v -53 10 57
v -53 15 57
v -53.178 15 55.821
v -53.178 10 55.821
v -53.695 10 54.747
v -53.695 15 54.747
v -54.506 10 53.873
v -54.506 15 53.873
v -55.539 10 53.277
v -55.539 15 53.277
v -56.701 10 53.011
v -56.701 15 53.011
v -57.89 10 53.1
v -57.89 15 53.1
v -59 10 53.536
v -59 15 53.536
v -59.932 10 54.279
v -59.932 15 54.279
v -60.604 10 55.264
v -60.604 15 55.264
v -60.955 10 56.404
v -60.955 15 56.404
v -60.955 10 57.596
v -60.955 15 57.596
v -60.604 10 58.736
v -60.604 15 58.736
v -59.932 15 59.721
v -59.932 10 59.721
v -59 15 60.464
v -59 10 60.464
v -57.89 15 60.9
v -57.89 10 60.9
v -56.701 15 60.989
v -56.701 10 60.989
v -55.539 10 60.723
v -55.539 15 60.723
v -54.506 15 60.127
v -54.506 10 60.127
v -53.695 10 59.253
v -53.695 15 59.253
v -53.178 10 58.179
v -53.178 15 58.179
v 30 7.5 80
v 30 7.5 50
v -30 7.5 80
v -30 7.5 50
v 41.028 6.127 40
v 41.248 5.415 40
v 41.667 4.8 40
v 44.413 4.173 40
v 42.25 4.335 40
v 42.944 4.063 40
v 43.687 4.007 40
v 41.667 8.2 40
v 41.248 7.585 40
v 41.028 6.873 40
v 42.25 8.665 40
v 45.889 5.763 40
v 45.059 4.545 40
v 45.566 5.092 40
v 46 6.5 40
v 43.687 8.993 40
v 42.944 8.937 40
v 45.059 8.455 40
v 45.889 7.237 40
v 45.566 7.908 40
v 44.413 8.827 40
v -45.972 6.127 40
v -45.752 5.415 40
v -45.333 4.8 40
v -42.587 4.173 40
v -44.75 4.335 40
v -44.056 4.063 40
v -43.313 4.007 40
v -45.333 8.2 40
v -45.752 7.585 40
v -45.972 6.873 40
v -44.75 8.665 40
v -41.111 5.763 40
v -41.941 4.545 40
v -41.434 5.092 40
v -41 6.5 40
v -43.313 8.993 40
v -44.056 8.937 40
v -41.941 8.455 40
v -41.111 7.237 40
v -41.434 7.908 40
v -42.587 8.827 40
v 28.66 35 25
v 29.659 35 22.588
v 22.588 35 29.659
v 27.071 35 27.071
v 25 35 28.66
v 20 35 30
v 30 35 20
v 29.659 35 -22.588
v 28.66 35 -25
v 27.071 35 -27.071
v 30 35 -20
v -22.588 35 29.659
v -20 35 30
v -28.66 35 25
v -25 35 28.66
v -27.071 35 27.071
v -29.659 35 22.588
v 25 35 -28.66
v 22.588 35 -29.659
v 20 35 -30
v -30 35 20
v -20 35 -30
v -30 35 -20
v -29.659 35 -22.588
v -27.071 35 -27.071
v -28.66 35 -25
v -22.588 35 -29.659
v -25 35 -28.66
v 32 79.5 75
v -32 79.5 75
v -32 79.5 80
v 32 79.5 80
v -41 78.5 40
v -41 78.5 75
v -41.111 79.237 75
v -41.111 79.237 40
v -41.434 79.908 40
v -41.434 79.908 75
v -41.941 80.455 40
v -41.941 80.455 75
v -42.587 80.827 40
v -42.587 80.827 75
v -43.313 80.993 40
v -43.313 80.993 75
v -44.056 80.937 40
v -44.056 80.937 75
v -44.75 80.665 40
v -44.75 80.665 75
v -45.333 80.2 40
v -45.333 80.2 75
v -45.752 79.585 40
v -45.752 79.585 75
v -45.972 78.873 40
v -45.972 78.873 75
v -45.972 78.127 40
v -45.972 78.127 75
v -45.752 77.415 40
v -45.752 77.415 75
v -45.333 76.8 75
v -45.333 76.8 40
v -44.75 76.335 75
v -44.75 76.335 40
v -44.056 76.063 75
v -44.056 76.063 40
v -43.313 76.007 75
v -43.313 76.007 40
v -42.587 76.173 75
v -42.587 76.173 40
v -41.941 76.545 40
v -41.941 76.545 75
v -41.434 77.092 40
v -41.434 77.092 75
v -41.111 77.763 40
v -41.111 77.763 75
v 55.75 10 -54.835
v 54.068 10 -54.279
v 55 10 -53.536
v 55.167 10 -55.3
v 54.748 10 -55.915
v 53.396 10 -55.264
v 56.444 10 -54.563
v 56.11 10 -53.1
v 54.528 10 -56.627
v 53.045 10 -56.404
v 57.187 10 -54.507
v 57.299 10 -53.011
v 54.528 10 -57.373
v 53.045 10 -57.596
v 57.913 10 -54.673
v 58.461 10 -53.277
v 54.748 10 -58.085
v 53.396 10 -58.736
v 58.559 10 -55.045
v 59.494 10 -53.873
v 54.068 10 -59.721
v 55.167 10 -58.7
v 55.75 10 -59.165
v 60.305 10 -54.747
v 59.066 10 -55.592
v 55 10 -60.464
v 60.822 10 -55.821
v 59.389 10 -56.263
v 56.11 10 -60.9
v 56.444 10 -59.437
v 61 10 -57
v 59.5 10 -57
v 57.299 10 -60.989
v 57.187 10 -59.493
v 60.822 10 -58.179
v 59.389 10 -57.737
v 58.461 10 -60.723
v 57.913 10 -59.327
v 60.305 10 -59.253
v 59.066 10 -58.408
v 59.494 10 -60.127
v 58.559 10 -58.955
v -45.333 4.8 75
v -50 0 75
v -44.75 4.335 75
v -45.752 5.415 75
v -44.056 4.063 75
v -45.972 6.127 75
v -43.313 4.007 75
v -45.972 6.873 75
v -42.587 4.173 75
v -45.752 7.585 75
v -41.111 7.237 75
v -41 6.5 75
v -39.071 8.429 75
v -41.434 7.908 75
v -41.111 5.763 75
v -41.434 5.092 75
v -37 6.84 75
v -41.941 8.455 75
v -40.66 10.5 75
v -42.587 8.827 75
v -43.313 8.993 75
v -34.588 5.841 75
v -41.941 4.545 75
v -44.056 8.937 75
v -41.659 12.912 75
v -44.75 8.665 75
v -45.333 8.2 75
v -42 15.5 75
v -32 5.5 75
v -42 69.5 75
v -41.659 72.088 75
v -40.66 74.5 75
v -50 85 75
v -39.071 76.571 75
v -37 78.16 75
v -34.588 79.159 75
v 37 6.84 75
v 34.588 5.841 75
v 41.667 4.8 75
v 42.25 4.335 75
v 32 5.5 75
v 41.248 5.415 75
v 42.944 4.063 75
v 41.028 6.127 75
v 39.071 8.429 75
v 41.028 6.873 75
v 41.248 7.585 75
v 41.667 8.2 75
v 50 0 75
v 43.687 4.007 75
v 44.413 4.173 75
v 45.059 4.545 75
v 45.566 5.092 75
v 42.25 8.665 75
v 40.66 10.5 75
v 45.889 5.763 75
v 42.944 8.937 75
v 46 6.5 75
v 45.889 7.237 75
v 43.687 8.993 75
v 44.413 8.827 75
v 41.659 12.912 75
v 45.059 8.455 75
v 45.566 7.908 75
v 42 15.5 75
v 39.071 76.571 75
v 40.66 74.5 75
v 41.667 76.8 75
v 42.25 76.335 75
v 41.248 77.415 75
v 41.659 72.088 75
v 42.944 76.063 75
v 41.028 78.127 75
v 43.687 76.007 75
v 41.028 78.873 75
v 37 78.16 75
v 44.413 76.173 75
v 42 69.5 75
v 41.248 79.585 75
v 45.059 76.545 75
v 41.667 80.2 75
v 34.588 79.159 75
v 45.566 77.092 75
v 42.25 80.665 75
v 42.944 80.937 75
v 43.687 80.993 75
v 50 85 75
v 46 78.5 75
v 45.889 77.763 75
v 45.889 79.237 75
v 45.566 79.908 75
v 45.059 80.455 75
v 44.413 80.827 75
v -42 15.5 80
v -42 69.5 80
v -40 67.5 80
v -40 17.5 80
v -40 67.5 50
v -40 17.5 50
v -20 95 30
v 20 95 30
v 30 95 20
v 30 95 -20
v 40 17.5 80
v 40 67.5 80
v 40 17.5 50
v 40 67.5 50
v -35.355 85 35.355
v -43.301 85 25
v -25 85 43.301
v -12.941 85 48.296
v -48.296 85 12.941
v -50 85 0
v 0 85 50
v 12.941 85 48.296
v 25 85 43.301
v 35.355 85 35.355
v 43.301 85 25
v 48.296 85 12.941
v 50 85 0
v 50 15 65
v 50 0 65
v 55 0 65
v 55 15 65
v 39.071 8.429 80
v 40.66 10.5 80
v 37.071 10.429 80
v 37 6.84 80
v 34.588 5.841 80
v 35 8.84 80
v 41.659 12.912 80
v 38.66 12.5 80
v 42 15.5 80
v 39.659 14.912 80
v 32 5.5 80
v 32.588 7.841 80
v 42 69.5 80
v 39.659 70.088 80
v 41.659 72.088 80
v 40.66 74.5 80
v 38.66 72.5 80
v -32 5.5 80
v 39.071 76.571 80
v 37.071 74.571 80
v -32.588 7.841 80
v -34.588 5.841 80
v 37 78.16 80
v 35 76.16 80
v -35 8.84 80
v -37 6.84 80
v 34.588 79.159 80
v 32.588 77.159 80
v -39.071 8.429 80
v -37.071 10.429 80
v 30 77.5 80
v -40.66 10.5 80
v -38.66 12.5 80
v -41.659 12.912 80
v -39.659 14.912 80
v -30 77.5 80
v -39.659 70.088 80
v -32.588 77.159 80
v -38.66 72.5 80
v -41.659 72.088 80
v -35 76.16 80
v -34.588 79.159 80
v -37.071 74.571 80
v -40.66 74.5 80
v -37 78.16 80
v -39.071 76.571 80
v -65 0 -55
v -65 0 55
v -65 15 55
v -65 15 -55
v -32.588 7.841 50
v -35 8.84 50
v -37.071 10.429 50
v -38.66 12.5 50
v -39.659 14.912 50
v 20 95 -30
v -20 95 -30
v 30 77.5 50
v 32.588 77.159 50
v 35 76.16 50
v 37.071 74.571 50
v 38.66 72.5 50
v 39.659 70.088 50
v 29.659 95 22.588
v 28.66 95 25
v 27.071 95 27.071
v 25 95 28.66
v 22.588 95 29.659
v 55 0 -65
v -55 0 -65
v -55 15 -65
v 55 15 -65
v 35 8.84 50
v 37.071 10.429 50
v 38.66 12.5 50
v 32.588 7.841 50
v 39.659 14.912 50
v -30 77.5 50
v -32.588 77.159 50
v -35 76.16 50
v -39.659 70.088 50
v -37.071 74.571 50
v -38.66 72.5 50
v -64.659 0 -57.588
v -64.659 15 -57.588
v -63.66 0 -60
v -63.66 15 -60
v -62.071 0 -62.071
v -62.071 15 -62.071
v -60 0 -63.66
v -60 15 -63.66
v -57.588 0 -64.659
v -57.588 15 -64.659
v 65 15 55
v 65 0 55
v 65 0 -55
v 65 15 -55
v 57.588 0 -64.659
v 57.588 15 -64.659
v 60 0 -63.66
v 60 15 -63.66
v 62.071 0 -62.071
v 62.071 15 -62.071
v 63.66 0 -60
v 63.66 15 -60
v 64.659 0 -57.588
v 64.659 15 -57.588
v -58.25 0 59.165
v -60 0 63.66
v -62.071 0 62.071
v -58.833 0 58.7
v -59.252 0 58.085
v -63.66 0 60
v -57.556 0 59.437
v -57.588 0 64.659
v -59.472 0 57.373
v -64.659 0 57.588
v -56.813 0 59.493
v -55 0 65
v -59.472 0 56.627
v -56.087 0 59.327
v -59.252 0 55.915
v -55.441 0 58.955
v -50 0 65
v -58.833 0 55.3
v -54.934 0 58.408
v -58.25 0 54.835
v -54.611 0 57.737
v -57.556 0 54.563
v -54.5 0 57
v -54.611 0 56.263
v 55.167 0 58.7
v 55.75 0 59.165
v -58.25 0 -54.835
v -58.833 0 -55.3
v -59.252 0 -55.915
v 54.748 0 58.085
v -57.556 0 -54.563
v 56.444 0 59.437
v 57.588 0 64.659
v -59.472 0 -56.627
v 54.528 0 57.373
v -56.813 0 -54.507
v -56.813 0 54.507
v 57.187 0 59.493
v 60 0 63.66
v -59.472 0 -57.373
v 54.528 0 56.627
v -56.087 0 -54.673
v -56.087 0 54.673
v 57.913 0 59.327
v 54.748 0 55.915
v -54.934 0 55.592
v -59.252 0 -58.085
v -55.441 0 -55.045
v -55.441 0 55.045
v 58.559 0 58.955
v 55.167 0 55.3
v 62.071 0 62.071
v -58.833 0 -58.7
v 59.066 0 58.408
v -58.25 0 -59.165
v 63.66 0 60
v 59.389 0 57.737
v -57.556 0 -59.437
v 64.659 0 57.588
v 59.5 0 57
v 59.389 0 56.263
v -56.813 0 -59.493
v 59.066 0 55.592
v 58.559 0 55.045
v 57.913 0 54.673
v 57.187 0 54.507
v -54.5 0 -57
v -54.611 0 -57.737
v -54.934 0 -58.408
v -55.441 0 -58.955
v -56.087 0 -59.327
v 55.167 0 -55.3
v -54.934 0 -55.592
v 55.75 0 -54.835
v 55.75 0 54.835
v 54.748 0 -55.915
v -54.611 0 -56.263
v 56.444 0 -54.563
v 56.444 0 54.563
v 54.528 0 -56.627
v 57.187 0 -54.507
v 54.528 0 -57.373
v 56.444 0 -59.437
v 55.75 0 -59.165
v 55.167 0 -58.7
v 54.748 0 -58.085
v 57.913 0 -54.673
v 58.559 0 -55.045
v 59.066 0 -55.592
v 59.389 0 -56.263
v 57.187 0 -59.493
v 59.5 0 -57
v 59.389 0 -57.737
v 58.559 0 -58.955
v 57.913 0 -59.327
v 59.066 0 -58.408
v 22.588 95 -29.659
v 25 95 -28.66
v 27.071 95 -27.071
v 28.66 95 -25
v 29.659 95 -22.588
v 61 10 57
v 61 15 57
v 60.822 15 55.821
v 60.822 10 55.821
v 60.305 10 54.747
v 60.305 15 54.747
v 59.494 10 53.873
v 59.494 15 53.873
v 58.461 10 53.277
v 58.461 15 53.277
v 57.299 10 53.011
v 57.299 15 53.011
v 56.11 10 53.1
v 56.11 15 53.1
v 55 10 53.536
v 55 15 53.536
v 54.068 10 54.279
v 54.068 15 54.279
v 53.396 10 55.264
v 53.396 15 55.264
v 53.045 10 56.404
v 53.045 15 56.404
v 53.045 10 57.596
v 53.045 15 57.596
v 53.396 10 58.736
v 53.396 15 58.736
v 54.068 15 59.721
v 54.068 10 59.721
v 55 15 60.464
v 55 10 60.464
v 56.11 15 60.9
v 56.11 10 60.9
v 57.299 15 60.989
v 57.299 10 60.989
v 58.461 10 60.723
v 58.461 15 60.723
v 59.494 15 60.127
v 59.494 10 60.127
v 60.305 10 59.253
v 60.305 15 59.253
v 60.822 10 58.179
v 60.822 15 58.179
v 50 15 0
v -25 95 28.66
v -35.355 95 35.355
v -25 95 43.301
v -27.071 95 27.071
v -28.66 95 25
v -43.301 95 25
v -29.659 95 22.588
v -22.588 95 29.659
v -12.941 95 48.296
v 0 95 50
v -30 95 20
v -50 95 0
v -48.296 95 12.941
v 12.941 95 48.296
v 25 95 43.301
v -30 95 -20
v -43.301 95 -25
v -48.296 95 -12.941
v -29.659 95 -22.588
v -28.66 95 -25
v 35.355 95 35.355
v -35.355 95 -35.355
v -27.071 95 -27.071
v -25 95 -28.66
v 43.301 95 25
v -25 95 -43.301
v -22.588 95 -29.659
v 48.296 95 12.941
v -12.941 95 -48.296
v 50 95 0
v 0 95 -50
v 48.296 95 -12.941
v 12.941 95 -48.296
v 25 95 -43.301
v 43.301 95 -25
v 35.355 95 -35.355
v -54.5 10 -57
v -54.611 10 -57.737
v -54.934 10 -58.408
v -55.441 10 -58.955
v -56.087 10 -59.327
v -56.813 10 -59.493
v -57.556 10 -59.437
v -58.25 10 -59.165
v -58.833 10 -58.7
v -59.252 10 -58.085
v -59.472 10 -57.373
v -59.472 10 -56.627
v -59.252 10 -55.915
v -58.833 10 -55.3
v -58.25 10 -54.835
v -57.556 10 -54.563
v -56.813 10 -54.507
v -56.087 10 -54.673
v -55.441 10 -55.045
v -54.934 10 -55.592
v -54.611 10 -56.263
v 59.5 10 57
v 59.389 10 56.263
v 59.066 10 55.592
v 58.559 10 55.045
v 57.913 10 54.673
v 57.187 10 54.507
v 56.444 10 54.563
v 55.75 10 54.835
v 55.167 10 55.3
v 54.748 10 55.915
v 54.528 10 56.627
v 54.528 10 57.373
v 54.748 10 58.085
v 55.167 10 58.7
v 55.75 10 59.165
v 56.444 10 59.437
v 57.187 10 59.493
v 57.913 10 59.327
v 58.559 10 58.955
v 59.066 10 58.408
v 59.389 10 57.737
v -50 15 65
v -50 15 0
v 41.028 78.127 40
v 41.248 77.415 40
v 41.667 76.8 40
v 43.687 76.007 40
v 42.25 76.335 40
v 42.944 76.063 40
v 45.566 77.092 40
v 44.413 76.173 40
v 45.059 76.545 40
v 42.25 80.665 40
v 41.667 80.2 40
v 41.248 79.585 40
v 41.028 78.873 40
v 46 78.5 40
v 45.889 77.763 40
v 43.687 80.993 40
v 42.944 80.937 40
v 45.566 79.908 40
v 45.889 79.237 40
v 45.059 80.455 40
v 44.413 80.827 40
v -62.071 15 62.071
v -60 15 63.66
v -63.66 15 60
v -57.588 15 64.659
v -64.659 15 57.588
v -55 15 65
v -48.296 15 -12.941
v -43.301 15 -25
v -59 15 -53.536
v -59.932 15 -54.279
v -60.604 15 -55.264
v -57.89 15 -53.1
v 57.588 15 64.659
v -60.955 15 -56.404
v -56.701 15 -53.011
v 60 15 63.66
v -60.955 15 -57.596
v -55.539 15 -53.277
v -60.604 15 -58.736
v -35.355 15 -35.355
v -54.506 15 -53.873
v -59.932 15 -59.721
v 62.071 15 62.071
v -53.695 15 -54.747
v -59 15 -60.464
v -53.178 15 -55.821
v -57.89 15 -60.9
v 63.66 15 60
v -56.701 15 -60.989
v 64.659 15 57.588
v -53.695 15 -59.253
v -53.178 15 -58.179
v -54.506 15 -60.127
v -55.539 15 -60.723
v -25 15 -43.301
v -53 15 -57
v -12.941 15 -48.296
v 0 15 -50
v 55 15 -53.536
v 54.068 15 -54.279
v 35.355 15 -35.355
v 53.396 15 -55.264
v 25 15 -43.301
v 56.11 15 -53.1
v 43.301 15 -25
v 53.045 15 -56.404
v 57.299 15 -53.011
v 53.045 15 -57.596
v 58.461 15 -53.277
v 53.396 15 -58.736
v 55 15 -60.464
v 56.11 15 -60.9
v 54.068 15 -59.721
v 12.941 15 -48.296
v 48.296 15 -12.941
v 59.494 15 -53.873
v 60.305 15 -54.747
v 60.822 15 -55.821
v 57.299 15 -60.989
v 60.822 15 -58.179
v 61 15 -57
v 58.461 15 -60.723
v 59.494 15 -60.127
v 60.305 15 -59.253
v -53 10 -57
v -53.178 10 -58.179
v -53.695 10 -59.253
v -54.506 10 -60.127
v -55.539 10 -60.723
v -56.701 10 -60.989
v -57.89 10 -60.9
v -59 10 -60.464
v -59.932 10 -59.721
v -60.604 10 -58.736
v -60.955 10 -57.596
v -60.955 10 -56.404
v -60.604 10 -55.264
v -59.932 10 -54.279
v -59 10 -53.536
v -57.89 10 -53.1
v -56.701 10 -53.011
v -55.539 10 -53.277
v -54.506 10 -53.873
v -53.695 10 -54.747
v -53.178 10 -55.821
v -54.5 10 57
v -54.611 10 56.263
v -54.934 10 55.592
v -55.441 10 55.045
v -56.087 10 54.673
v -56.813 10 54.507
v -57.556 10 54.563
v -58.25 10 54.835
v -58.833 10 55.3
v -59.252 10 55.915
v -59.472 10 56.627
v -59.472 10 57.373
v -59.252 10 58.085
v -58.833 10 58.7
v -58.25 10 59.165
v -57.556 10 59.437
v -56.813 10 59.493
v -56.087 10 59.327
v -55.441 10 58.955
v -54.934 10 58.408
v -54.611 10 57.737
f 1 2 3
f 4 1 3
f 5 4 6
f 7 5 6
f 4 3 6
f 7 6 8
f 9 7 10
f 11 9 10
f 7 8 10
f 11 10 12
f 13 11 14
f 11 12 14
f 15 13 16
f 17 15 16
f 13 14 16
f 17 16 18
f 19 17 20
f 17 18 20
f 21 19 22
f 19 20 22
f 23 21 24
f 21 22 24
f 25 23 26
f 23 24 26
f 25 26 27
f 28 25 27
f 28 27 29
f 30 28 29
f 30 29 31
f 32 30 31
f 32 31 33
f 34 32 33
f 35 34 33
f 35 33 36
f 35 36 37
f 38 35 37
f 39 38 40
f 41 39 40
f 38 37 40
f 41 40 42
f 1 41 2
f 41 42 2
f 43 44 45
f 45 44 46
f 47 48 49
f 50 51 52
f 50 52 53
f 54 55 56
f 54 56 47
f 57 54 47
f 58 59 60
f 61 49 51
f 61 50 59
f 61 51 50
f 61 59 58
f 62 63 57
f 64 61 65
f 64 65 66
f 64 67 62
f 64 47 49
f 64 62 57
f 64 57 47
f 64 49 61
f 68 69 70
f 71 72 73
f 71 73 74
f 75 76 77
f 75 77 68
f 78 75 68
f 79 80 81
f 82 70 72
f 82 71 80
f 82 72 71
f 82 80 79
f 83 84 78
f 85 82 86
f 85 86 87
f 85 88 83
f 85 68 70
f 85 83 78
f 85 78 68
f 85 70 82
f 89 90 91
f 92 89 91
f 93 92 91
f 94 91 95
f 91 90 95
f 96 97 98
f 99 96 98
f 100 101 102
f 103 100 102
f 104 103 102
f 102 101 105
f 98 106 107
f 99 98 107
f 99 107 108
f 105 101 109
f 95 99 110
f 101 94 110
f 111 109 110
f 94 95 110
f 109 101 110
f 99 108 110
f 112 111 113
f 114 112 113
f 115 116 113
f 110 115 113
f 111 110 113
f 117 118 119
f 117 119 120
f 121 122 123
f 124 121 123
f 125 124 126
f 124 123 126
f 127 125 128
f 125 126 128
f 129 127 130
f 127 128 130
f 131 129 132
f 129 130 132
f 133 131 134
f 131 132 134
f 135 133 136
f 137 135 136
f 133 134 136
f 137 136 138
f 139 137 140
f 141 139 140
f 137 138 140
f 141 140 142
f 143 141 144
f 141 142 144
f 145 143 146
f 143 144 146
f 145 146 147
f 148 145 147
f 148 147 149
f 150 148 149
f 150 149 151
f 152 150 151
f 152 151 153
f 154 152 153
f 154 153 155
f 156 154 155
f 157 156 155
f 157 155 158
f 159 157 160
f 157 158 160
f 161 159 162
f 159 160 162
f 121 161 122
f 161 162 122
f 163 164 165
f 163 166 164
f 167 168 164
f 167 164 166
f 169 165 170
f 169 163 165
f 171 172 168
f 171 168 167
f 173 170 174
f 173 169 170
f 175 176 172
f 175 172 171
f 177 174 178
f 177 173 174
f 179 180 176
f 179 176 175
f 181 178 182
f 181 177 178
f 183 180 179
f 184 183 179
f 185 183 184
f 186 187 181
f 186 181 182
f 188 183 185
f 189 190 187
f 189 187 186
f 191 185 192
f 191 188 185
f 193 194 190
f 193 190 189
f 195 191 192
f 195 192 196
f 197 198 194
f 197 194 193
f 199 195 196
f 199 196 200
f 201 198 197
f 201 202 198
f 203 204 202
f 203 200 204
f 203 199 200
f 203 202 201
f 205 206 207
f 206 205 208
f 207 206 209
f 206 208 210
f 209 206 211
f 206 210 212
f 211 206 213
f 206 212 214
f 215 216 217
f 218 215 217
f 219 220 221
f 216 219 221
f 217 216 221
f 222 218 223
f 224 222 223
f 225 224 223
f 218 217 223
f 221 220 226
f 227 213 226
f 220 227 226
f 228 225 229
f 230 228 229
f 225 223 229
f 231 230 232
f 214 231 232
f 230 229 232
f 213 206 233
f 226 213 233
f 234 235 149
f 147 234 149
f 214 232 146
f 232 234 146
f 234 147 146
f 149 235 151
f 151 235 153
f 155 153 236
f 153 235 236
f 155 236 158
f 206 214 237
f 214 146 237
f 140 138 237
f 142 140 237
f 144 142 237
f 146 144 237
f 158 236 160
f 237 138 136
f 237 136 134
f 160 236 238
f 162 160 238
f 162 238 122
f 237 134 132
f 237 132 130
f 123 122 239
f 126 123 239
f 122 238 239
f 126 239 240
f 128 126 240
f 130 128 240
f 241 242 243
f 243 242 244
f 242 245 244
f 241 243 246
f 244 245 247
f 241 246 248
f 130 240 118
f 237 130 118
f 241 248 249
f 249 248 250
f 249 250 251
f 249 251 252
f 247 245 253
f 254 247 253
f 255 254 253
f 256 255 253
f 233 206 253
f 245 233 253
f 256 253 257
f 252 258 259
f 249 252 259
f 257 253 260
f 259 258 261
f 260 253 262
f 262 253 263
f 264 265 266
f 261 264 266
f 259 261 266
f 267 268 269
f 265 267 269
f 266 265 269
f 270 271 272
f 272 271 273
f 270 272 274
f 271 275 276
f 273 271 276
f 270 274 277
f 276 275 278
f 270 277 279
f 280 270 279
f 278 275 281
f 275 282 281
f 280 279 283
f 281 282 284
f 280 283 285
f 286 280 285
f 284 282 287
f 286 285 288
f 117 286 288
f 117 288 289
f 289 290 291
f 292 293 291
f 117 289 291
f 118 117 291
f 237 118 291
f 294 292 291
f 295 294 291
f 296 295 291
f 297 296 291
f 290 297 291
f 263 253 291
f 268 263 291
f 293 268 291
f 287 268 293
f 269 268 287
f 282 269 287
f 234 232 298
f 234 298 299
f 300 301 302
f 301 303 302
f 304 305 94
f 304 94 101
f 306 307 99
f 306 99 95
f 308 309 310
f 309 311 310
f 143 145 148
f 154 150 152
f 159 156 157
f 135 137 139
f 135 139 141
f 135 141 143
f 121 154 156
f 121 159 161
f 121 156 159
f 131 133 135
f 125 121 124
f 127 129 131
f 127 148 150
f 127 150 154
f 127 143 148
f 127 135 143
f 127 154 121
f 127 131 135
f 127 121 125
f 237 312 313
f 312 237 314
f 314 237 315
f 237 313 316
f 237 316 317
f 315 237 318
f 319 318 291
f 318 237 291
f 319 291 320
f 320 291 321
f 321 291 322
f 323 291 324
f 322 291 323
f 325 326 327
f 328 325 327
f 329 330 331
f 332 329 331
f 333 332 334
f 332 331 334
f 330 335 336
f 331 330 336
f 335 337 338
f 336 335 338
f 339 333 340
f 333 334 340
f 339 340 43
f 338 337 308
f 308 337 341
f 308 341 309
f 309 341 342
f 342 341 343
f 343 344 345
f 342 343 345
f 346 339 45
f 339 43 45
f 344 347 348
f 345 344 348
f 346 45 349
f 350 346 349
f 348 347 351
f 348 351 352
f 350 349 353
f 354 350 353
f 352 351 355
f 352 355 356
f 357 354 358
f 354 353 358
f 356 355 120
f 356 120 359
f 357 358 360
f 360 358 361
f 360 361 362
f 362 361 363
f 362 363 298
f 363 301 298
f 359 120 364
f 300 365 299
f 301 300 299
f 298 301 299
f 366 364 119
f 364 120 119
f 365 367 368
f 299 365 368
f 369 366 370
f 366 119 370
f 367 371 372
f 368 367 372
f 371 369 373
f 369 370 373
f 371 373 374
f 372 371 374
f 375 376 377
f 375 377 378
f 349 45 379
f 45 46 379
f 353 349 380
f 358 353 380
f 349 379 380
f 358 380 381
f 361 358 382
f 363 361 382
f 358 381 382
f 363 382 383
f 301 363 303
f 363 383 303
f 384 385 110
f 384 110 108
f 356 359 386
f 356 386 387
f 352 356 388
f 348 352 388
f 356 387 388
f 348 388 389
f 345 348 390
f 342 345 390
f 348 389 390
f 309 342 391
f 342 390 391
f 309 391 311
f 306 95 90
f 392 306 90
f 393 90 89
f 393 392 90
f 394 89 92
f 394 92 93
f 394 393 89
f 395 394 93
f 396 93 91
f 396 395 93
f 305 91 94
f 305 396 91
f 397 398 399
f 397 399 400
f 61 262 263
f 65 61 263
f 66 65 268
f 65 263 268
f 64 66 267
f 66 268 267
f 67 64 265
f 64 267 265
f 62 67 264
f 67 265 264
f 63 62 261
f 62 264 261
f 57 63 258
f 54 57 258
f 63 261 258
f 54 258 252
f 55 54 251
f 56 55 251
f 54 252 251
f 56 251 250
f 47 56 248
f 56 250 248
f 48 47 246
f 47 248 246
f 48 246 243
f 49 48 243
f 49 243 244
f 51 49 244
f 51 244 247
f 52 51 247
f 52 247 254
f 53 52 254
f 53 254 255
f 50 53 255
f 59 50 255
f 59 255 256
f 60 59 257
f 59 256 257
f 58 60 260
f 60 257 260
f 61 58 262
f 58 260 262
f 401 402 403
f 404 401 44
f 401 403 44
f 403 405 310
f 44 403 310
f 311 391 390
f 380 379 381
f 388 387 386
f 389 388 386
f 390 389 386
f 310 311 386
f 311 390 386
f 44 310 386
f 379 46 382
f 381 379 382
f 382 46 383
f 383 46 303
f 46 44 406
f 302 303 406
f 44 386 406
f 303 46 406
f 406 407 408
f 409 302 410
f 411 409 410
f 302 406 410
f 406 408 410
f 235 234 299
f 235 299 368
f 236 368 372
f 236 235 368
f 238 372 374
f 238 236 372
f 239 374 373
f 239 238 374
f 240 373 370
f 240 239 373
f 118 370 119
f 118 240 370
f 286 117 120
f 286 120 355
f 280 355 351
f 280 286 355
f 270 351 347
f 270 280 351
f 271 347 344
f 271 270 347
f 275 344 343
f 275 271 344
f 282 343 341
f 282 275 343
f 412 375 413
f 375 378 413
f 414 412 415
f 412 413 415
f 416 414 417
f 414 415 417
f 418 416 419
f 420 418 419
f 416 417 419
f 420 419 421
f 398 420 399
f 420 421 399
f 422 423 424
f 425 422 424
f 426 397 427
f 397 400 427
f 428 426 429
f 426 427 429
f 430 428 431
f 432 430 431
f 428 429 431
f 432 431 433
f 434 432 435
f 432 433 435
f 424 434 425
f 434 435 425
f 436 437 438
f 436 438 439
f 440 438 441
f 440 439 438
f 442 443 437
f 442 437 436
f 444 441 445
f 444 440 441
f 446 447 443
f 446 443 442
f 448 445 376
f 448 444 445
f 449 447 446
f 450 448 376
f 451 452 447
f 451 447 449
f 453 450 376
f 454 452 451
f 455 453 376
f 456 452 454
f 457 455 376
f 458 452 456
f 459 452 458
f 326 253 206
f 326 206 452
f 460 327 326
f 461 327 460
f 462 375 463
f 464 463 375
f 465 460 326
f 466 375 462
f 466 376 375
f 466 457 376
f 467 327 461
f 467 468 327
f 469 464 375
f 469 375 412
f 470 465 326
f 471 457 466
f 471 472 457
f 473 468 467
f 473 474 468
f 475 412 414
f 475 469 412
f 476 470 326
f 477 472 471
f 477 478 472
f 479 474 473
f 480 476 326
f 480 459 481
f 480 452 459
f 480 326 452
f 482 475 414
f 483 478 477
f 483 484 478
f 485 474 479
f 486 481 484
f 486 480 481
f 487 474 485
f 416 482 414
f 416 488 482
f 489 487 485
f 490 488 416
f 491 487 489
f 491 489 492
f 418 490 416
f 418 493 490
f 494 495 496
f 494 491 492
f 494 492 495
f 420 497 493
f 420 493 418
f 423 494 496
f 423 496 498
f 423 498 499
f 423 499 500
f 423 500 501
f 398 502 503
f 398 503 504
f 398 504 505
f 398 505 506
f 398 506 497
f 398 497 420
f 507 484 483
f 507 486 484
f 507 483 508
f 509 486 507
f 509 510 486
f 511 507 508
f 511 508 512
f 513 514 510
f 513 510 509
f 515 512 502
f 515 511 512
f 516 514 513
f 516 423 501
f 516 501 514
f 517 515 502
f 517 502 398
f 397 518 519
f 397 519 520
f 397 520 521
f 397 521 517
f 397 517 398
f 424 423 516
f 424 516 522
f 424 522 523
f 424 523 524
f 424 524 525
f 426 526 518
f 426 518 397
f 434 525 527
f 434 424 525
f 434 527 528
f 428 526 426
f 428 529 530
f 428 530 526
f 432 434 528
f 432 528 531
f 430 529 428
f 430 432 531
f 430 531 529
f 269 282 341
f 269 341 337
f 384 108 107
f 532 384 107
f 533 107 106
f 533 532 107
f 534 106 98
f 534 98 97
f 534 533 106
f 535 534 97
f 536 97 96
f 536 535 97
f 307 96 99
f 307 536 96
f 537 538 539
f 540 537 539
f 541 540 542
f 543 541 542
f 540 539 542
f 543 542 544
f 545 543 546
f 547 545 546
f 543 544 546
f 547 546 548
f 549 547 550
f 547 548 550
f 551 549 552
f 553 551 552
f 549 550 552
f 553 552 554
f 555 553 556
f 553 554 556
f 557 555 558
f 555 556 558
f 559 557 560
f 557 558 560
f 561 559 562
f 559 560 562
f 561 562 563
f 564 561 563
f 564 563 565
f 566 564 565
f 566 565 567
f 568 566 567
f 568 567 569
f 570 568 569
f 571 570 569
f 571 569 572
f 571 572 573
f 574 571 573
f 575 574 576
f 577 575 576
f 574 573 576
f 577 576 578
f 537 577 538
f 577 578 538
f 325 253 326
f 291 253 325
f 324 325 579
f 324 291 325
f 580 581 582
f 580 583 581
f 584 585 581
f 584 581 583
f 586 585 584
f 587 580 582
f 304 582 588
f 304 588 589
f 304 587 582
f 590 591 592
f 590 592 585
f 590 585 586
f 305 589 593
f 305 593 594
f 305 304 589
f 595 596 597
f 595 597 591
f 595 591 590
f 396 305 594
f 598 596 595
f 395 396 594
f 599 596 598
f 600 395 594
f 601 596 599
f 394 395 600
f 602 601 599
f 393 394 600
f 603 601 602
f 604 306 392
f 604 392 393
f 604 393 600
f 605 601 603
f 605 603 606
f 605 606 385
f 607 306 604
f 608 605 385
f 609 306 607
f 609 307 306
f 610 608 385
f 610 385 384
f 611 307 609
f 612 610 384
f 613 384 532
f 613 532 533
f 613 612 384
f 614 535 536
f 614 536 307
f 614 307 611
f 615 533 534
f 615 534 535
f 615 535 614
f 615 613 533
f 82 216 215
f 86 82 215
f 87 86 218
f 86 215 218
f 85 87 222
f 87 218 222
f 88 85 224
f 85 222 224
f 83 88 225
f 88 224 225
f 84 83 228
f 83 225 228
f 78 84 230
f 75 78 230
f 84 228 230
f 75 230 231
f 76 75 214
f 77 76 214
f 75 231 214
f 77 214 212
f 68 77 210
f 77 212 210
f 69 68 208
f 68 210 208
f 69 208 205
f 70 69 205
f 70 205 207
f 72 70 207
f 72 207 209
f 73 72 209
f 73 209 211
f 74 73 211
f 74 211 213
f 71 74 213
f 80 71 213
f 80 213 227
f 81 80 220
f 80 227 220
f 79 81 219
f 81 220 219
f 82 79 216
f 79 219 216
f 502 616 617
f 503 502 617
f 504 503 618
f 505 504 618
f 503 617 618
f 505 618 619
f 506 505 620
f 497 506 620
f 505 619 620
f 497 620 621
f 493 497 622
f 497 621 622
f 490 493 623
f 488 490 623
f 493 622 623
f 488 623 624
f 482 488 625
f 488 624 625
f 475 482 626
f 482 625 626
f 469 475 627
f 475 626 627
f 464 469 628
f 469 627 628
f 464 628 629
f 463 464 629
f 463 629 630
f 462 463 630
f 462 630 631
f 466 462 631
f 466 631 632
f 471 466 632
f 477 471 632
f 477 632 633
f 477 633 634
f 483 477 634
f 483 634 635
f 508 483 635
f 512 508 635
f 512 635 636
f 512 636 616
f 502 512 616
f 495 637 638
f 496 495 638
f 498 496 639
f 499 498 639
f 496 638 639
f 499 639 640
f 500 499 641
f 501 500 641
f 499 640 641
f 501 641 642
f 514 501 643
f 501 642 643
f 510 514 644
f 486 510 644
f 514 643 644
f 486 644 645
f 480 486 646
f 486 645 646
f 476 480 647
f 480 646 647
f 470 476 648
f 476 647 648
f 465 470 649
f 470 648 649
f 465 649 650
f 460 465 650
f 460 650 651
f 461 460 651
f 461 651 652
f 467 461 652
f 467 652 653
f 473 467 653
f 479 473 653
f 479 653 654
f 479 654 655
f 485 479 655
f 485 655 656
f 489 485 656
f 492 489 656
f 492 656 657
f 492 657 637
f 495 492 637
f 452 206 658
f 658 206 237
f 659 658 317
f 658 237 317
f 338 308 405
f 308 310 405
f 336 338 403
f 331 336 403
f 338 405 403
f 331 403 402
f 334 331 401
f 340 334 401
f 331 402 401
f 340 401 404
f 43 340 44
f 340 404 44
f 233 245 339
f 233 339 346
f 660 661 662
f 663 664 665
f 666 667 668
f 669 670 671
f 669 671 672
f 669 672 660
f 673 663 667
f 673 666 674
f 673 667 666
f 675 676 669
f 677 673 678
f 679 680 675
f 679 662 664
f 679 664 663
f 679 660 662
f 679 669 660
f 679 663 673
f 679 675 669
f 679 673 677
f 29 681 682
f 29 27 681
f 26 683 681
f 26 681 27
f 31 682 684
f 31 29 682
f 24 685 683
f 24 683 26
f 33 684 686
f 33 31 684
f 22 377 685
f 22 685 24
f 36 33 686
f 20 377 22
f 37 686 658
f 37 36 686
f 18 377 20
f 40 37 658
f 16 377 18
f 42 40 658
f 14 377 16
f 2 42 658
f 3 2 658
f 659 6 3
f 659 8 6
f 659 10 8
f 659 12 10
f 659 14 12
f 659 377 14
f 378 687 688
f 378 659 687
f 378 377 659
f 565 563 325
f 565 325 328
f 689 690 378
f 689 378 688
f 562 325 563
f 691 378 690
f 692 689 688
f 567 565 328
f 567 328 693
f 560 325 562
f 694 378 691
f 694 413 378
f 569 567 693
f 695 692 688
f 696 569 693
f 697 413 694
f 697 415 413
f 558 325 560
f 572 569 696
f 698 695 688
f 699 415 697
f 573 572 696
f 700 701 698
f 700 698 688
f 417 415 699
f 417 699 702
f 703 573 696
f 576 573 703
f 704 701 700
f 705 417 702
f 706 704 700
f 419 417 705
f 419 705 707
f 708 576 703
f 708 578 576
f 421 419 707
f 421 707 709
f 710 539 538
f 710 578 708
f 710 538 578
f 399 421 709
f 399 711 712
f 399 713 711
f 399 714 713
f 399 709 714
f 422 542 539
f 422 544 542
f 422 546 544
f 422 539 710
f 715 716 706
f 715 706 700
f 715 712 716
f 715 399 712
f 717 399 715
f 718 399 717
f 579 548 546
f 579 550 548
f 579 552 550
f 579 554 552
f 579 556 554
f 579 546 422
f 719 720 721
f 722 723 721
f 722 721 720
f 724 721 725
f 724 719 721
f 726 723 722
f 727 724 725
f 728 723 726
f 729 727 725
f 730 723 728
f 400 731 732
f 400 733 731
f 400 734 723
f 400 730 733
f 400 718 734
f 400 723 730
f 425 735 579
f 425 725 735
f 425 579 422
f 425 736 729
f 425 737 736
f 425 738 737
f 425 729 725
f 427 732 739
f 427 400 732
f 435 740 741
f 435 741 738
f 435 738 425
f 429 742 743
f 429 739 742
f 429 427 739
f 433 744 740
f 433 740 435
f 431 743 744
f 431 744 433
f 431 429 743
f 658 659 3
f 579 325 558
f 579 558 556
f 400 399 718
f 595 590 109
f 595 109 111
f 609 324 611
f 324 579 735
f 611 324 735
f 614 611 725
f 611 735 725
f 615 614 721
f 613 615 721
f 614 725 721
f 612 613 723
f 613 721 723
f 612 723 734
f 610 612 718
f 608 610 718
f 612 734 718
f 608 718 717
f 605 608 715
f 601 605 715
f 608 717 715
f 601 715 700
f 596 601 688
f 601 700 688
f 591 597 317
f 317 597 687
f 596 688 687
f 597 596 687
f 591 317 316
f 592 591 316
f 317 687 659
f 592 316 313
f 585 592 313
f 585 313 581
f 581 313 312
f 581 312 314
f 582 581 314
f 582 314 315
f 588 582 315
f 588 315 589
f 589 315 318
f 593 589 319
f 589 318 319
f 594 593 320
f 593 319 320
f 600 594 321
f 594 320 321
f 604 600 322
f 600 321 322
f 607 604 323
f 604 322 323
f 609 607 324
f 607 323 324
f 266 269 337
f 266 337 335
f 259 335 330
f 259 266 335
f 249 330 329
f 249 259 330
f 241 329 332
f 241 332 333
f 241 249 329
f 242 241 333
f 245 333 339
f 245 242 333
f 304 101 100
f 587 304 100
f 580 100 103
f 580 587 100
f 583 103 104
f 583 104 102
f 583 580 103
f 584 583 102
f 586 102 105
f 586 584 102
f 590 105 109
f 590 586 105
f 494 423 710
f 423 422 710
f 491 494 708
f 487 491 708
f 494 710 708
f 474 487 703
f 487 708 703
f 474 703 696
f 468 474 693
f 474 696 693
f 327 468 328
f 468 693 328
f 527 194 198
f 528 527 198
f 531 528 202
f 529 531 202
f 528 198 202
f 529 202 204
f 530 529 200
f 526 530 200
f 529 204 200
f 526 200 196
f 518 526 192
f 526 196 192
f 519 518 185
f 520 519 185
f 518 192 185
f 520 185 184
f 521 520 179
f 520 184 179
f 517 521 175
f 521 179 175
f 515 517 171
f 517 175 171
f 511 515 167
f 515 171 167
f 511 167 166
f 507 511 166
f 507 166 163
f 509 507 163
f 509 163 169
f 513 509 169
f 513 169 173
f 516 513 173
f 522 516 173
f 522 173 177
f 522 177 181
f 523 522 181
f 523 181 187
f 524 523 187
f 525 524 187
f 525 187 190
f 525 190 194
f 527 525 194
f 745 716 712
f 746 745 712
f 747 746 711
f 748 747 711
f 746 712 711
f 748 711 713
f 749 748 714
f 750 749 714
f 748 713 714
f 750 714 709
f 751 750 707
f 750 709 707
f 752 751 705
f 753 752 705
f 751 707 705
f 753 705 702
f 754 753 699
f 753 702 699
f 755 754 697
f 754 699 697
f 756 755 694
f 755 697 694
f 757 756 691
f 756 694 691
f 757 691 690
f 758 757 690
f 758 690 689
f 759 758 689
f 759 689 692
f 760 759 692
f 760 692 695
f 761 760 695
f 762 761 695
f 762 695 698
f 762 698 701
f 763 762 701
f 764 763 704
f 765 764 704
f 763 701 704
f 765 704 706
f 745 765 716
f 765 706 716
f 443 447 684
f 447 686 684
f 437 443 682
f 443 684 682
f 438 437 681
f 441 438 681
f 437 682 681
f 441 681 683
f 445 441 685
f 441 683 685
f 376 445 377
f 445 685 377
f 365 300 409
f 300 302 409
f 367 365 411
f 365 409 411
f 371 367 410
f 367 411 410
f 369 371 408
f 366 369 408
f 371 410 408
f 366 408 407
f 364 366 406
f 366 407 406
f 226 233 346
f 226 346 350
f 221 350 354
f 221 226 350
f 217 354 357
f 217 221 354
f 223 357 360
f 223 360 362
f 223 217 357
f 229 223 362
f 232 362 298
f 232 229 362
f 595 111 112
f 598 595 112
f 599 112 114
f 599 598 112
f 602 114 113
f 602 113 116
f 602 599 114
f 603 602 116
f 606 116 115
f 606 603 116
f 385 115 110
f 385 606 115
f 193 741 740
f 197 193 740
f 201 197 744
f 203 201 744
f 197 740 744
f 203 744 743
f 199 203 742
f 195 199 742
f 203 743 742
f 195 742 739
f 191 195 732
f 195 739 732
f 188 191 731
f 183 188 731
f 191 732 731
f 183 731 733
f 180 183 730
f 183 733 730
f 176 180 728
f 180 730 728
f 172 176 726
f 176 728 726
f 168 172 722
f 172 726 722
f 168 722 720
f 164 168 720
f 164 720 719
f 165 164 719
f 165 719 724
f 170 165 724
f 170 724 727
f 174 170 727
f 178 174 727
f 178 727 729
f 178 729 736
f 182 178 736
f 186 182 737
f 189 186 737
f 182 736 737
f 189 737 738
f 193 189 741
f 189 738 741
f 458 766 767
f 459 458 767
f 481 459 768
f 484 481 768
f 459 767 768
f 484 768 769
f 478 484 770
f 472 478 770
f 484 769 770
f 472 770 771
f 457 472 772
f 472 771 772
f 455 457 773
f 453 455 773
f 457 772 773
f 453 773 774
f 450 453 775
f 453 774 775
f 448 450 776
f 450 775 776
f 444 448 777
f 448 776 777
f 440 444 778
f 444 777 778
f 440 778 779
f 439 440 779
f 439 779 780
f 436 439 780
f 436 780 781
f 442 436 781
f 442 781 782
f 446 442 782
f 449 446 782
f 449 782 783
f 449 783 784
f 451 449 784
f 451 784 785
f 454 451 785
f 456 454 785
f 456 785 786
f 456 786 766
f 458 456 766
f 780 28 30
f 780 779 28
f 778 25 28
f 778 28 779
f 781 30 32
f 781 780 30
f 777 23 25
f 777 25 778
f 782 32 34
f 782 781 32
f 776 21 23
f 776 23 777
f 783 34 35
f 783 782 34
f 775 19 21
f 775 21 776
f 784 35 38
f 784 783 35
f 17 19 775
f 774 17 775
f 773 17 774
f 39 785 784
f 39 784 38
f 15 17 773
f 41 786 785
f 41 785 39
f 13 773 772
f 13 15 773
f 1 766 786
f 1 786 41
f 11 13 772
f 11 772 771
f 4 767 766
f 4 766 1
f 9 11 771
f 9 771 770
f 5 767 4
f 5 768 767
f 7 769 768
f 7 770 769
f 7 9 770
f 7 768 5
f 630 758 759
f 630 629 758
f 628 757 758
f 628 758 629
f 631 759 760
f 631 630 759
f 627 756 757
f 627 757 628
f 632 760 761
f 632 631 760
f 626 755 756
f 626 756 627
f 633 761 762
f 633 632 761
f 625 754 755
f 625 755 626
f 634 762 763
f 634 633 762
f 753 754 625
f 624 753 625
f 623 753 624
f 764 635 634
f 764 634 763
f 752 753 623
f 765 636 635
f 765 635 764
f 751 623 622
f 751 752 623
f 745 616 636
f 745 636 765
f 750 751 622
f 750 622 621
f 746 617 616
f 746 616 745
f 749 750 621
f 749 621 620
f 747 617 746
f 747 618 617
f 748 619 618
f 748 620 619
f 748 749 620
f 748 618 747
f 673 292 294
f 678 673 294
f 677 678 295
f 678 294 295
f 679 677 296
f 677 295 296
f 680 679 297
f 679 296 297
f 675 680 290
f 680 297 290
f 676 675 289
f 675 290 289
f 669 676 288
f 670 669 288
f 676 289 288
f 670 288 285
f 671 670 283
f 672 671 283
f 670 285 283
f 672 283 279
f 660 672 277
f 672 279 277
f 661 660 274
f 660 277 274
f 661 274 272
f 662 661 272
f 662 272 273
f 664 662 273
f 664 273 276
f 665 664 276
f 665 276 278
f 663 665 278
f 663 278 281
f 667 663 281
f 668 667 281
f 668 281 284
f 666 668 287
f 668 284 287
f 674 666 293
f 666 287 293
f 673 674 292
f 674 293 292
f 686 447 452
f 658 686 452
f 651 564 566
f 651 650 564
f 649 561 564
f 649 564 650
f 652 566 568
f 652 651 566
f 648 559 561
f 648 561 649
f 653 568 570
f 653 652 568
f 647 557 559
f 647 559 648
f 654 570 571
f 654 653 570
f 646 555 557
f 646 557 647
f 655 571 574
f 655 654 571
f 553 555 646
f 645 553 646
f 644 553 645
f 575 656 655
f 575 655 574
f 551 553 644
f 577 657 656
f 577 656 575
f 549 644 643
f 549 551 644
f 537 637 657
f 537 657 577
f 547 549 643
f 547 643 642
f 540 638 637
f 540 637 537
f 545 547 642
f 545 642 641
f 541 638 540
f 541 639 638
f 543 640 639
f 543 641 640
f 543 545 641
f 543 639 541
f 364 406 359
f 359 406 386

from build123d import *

# Parameters (mm, degrees)
SKETCH1_W           = 130
SKETCH1_H           = 130
BOSS_EXTRUDE1_DEPTH = 15
SKETCH2_R           = 50
BOSS_EXTRUDE2_DEPTH = 80
SKETCH3_W           = 75
SKETCH3_H           = 85
BOSS_EXTRUDE3_DEPTH = 50
CUT_EXTRUDE2_DEPTH  = 60
CUT_EXTRUDE4_DEPTH  = 25
SKETCH6_R           = 2.5
CUT_EXTRUDE5_DEPTH  = 35
FILLET1_R           = 10
BOSS_EXTRUDE5_DEPTH = 5
SKETCH8_R           = 2.5
CUT_EXTRUDE6_DEPTH  = 16
SKETCH9_R           = 4
CUT_EXTRUDE7_DEPTH  = 5


with BuildPart() as part:
    # Sketch1 → Boss-Extrude1 (new body)
    with BuildSketch(Plane(origin=(0, 0, 0), x_dir=(1, 0, 0), z_dir=(0, 1, 0))):
        Rectangle(SKETCH1_W, SKETCH1_H)
    extrude(amount=BOSS_EXTRUDE1_DEPTH)

    # Sketch2 → Boss-Extrude2 (add)
    with BuildSketch(Plane(origin=(0, 15, 0), x_dir=(1, 0, 0), z_dir=(0, 1, 0))):
        Circle(SKETCH2_R)
    extrude(amount=BOSS_EXTRUDE2_DEPTH)

    # Sketch3 → Boss-Extrude3 (add, symmetric)
    with BuildSketch(Plane(origin=(0, 0, 0), x_dir=(0, 0, -1), z_dir=(1, 0, 0))):
        with Locations((-37.5, 42.5)):
            Rectangle(SKETCH3_W, SKETCH3_H)
    extrude(amount=BOSS_EXTRUDE3_DEPTH, both=True)

    # Sketch4 → Cut-Extrude2 (cut)
    with BuildSketch(Plane(origin=(0, 95, 0), x_dir=(1, 0, 0), z_dir=(0, 1, 0))):
        with BuildLine():
            Line((-20, 30), (20, 30))
            ThreePointArc((20, 30), (27.071067812, 27.071067812), (30, 20))
            Line((30, 20), (30, -20))
            ThreePointArc((30, -20), (27.071067812, -27.071067812), (20, -30))
            Line((20, -30), (-20, -30))
            ThreePointArc((-20, -30), (-27.071067812, -27.071067812), (-30, -20))
            Line((-30, -20), (-30, 20))
            ThreePointArc((-30, 20), (-27.071067812, 27.071067812), (-20, 30))
        make_face()
    extrude(amount=-CUT_EXTRUDE2_DEPTH, mode=Mode.SUBTRACT)

    # Sketch5 → Cut-Extrude4 (cut)
    with BuildSketch(Plane.XY.offset(75)):
        with BuildLine():
            Line((-30, 77.5), (30, 77.5))
            ThreePointArc((30, 77.5), (37.071067812, 74.571067812), (40, 67.5))
            Line((40, 67.5), (40, 17.5))
            ThreePointArc((40, 17.5), (37.071067812, 10.428932188), (30, 7.5))
            Line((30, 7.5), (-30, 7.5))
            ThreePointArc((-30, 7.5), (-37.071067812, 10.428932188), (-40, 17.5))
            Line((-40, 17.5), (-40, 67.5))
            ThreePointArc((-40, 67.5), (-37.071067812, 74.571067812), (-30, 77.5))
        make_face()
    extrude(amount=-CUT_EXTRUDE4_DEPTH, mode=Mode.SUBTRACT)

    # Sketch6 → Cut-Extrude5 (cut)
    with BuildSketch(Plane.XY.offset(75)):
        with Locations((-43.5, 78.5)):
            Circle(SKETCH6_R)
        with Locations((43.5, 78.5)):
            Circle(SKETCH6_R)
        with Locations((43.5, 6.5)):
            Circle(SKETCH6_R)
        with Locations((-43.5, 6.5)):
            Circle(SKETCH6_R)
    extrude(amount=-CUT_EXTRUDE5_DEPTH, mode=Mode.SUBTRACT)

    # Fillet1
    fillet1_edges = [part.edges().sort_by_distance(p)[0] for p in [
        (65, 7.5, 65),
        (-65, 7.5, 65),
        (-65, 7.5, -65),
        (65, 7.5, -65),
    ]]
    fillet(fillet1_edges, radius=FILLET1_R)

    # Sketch7 → Boss-Extrude5 (add)
    with BuildSketch(Plane.XY.offset(75)):
        with BuildLine():
            Line((-32, 79.5), (32, 79.5))
            ThreePointArc((32, 79.5), (39.071067812, 76.571067812), (42, 69.5))
            Line((42, 69.5), (42, 15.5))
            ThreePointArc((42, 15.5), (39.071067812, 8.428932188), (32, 5.5))
            Line((32, 5.5), (-32, 5.5))
            ThreePointArc((-32, 5.5), (-39.071067812, 8.428932188), (-42, 15.5))
            Line((-42, 15.5), (-42, 69.5))
            ThreePointArc((-42, 69.5), (-39.071067812, 76.571067812), (-32, 79.5))
        make_face()
        with BuildLine():
            Line((-30, 77.5), (30, 77.5))
            ThreePointArc((30, 77.5), (37.071067812, 74.571067812), (40, 67.5))
            Line((40, 67.5), (40, 17.5))
            ThreePointArc((40, 17.5), (37.071067812, 10.428932188), (30, 7.5))
            Line((30, 7.5), (-30, 7.5))
            ThreePointArc((-30, 7.5), (-37.071067812, 10.428932188), (-40, 17.5))
            Line((-40, 17.5), (-40, 67.5))
            ThreePointArc((-40, 67.5), (-37.071067812, 74.571067812), (-30, 77.5))
        make_face(mode=Mode.SUBTRACT)
    extrude(amount=BOSS_EXTRUDE5_DEPTH)

    # Sketch8 → Cut-Extrude6 (cut, through all)
    with BuildSketch(Plane(origin=(0, 15, 0), x_dir=(1, 0, 0), z_dir=(0, 1, 0))):
        with Locations((-57, 57)):
            Circle(SKETCH8_R)
        with Locations((-57, -57)):
            Circle(SKETCH8_R)
        with Locations((57, -57)):
            Circle(SKETCH8_R)
        with Locations((57, 57)):
            Circle(SKETCH8_R)
    extrude(amount=-CUT_EXTRUDE6_DEPTH, mode=Mode.SUBTRACT)

    # Sketch9 → Cut-Extrude7 (cut)
    with BuildSketch(Plane(origin=(0, 15, 0), x_dir=(1, 0, 0), z_dir=(0, 1, 0))):
        with Locations((-57, 57)):
            Circle(SKETCH9_R)
        with Locations((57, 57)):
            Circle(SKETCH9_R)
        with Locations((-57, -57)):
            Circle(SKETCH9_R)
        with Locations((57, -57)):
            Circle(SKETCH9_R)
    extrude(amount=-CUT_EXTRUDE7_DEPTH, mode=Mode.SUBTRACT)


solid = part.part
